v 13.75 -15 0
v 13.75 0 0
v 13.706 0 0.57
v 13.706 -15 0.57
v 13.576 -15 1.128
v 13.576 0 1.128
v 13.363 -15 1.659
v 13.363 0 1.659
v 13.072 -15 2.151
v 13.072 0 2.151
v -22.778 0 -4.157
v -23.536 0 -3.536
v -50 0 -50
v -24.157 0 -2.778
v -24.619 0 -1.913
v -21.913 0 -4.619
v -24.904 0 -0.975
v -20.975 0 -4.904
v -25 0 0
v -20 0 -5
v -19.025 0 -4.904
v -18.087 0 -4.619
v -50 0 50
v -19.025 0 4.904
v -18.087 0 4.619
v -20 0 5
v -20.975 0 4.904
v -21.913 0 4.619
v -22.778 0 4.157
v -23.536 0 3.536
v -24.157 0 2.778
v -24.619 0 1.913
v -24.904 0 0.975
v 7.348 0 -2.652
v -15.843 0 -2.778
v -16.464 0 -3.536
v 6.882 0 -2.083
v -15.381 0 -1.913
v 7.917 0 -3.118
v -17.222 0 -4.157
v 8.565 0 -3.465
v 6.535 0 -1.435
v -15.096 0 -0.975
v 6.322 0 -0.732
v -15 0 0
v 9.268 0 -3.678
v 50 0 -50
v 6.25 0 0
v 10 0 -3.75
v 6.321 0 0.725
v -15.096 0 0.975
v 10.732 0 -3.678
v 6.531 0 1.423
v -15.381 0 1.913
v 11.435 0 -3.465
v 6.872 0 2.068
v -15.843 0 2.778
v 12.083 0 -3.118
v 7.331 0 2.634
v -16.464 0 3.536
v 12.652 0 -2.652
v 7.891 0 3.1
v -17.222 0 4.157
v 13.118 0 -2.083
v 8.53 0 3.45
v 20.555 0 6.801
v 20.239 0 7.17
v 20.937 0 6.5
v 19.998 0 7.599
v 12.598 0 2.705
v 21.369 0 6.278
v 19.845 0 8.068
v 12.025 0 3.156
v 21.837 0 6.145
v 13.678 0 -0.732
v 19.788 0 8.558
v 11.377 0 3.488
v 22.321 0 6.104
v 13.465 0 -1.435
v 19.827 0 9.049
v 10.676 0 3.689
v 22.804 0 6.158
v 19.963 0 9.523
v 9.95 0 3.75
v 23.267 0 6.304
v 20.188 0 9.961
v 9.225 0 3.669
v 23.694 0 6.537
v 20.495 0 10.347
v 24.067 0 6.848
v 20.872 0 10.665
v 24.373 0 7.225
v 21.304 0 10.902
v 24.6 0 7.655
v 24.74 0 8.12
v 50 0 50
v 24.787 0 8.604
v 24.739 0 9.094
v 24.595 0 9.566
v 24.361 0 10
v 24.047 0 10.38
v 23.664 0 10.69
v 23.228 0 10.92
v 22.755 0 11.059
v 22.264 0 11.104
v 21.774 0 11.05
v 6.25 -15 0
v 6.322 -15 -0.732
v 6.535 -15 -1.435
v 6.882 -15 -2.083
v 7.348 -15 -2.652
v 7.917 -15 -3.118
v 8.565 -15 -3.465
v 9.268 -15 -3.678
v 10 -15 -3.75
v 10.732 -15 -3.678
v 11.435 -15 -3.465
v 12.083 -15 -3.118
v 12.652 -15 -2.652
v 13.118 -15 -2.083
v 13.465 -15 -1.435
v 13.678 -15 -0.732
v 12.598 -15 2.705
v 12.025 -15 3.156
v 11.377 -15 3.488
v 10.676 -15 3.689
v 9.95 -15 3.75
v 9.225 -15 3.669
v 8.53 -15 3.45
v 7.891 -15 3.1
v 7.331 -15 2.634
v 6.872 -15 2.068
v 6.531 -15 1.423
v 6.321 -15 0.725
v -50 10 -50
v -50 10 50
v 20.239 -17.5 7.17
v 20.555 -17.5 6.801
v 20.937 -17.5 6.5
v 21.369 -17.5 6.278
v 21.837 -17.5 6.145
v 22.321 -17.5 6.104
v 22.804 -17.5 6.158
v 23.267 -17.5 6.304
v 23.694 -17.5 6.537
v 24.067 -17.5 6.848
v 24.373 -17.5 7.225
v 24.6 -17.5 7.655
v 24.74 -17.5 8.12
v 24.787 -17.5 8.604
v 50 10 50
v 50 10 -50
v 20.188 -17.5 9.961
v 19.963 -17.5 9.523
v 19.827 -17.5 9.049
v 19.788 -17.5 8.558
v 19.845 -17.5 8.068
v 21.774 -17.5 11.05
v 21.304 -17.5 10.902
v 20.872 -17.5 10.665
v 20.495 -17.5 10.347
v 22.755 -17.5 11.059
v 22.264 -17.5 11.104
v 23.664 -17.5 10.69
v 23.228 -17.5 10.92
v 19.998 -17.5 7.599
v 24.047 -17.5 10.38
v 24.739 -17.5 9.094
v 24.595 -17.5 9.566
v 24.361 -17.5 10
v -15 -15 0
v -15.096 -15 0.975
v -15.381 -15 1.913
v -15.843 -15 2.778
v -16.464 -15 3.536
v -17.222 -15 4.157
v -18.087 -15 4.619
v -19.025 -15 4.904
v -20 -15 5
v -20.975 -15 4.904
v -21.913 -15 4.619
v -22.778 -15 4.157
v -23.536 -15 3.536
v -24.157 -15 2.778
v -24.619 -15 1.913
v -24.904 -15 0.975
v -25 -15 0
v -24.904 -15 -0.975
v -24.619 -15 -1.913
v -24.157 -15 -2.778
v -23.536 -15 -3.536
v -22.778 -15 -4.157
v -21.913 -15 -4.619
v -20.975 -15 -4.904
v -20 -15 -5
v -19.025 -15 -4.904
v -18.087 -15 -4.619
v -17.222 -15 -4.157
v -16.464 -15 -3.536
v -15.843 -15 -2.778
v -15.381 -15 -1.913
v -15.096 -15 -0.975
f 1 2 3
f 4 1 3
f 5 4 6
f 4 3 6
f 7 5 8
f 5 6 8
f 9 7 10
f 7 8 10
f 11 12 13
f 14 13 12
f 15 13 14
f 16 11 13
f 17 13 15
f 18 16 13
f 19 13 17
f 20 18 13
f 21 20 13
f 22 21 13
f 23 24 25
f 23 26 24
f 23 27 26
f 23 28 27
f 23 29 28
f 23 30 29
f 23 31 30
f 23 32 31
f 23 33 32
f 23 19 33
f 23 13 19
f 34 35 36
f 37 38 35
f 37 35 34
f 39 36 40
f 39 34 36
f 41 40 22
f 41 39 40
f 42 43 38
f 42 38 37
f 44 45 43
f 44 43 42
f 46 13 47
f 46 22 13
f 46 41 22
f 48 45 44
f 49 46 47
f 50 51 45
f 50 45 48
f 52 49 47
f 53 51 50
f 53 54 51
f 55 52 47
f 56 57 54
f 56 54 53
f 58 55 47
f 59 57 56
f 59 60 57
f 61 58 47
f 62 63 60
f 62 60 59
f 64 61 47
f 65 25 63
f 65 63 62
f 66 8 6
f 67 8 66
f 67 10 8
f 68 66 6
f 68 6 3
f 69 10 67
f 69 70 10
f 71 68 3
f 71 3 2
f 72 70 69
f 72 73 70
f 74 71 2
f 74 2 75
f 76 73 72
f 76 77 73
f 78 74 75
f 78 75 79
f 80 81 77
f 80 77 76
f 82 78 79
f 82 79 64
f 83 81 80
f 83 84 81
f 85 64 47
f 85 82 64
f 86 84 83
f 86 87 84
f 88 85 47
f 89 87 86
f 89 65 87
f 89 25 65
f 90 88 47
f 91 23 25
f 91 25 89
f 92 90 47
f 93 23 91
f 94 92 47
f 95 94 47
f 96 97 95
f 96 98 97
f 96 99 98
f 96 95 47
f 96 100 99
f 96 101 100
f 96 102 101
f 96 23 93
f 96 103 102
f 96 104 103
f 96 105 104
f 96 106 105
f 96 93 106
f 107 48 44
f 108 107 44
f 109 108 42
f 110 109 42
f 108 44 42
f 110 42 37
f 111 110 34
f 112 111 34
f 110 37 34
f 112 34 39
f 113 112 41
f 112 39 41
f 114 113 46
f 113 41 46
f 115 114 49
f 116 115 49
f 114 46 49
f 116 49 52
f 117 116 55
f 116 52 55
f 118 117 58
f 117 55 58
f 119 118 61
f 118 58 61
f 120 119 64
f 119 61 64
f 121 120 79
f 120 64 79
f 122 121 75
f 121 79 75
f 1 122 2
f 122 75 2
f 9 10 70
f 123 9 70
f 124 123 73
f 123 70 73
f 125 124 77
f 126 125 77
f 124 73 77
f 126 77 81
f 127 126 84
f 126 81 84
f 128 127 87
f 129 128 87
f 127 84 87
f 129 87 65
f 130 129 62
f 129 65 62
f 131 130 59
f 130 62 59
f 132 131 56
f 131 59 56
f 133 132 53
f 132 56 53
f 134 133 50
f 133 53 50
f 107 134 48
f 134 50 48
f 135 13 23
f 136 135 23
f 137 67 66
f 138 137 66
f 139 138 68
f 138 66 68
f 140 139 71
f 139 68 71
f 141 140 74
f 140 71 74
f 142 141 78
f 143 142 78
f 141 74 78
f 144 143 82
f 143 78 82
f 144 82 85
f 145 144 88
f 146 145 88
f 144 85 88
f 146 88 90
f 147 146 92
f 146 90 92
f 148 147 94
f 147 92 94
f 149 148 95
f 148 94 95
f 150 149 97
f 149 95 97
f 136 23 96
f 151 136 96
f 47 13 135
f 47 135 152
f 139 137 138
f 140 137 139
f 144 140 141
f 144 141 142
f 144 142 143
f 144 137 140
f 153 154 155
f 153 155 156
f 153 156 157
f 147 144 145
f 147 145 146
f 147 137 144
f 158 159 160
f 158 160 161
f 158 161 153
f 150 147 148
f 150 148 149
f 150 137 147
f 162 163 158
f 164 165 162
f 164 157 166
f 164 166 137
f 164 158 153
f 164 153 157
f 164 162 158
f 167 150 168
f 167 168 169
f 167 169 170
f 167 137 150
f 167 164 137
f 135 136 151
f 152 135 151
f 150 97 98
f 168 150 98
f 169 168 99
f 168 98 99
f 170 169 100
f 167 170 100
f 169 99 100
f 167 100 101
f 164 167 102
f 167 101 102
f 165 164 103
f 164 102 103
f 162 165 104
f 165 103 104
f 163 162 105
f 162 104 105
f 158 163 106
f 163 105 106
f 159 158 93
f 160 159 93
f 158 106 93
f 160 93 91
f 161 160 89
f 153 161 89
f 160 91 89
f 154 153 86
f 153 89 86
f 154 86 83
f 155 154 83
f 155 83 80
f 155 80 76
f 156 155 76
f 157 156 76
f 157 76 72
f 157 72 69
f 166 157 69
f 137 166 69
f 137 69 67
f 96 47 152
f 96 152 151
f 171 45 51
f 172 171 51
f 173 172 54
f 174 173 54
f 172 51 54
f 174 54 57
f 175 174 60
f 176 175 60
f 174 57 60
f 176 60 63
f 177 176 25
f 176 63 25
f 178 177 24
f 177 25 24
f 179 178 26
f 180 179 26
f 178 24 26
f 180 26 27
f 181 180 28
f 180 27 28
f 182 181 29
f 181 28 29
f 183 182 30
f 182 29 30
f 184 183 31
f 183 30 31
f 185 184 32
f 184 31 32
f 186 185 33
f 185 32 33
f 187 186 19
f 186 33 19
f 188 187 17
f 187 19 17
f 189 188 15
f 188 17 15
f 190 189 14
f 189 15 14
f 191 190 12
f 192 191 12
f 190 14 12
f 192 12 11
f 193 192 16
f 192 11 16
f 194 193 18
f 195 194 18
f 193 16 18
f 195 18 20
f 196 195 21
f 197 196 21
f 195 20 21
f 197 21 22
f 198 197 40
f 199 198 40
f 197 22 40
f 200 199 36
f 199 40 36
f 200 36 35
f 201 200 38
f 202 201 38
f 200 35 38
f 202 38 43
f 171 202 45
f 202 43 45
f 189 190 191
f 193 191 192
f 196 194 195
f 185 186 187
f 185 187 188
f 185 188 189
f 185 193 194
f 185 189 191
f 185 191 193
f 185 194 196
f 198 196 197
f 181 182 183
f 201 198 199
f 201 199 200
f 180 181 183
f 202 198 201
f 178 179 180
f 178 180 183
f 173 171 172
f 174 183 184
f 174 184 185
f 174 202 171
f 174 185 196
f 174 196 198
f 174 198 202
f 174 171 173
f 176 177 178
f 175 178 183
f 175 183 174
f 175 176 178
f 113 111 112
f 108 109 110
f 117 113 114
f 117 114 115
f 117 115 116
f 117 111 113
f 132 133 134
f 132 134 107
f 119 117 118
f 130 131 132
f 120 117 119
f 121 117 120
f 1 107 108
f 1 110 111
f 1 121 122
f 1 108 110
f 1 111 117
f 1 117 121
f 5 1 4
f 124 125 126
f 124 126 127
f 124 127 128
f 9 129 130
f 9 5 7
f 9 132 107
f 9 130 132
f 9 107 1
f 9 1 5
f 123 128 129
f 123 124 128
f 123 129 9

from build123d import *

# Parameters (mm, degrees)
F0_W     = 100
F0_H     = 100
F1_DEPTH = 10
F2_R     = 5
F3_DEPTH = 15
F4_DEPTH = 17.5


with BuildPart() as f1:
    # F0 (on Front) → F1 (new body)
    with BuildSketch(Plane.XZ):
        Rectangle(F0_W, F0_H)
    extrude(amount=-F1_DEPTH)

    # F2 (on face) → F3 (join)
    with BuildSketch(Plane.XZ):
        with Locations((-20, 0)):
            Circle(F2_R)
        with BuildLine():
            ThreePointArc((13.07182, 2.150912), (8.872353, 3.576439), (6.25, 0))
            Line((6.25, 0), (10, 0))
            Line((10, 0), (13.07182, 2.150912))
        make_face()
        with BuildLine():
            Line((10, 0), (6.25, 0))
            ThreePointArc((6.25, 0), (10, -3.75), (13.75, 0))
            ThreePointArc((13.75, 0), (13.576439, 1.127647), (13.07182, 2.150912))
            Line((13.07182, 2.150912), (10, 0))
        make_face()
    extrude(amount=F3_DEPTH)

    # F2 (on face) → F4 (join)
    with BuildSketch(Plane.XZ):
        with BuildLine():
            ThreePointArc((24.787281, 8.603647), (21.535516, 10.987939), (20.239401, 7.169705))
            ThreePointArc((20.239401, 7.169705), (23.039045, 6.219354), (24.787281, 8.603647))
        make_face()
    extrude(amount=F4_DEPTH)


solid = f1.part
